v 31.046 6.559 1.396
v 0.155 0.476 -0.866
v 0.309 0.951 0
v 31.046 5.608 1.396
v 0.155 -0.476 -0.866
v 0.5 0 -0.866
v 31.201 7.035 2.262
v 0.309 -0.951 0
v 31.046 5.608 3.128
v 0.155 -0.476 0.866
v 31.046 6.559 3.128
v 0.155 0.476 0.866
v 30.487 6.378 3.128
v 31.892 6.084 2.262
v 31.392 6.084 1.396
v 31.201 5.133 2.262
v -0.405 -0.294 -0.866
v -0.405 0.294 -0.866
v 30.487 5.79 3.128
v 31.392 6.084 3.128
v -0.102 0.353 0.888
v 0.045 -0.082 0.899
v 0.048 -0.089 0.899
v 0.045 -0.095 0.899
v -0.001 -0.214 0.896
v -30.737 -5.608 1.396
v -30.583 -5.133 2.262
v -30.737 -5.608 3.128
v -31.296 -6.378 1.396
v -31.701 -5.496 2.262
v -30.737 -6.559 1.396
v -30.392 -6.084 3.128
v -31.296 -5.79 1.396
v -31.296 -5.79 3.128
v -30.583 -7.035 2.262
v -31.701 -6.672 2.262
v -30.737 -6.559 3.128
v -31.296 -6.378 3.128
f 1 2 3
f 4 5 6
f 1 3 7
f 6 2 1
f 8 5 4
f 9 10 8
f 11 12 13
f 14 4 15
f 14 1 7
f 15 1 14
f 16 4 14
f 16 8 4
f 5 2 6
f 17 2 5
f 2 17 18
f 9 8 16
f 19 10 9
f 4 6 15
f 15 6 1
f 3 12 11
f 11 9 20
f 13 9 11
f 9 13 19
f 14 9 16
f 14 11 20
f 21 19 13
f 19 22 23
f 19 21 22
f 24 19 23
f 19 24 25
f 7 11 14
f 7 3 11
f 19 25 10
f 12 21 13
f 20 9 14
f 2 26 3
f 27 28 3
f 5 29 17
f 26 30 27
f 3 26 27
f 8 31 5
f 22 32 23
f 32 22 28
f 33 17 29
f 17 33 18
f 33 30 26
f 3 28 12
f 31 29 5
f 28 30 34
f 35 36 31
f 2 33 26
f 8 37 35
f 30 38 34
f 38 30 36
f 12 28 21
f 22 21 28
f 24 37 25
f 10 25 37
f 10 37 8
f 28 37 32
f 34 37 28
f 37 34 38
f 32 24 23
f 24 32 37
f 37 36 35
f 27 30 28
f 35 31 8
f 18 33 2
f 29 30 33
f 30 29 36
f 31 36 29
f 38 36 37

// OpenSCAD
function reflect (d,n)=d- 2*(d*n)*n;

p1= rands(0,50,3);
p3=reflect(-p1,[0,0,1]);
line(p1);
line(p3);

echo(p1);



module line(p1,p2=[0,0,0]){
hull(){
translate(p1)sphere(1);
translate(p2)sphere(1);
}}
